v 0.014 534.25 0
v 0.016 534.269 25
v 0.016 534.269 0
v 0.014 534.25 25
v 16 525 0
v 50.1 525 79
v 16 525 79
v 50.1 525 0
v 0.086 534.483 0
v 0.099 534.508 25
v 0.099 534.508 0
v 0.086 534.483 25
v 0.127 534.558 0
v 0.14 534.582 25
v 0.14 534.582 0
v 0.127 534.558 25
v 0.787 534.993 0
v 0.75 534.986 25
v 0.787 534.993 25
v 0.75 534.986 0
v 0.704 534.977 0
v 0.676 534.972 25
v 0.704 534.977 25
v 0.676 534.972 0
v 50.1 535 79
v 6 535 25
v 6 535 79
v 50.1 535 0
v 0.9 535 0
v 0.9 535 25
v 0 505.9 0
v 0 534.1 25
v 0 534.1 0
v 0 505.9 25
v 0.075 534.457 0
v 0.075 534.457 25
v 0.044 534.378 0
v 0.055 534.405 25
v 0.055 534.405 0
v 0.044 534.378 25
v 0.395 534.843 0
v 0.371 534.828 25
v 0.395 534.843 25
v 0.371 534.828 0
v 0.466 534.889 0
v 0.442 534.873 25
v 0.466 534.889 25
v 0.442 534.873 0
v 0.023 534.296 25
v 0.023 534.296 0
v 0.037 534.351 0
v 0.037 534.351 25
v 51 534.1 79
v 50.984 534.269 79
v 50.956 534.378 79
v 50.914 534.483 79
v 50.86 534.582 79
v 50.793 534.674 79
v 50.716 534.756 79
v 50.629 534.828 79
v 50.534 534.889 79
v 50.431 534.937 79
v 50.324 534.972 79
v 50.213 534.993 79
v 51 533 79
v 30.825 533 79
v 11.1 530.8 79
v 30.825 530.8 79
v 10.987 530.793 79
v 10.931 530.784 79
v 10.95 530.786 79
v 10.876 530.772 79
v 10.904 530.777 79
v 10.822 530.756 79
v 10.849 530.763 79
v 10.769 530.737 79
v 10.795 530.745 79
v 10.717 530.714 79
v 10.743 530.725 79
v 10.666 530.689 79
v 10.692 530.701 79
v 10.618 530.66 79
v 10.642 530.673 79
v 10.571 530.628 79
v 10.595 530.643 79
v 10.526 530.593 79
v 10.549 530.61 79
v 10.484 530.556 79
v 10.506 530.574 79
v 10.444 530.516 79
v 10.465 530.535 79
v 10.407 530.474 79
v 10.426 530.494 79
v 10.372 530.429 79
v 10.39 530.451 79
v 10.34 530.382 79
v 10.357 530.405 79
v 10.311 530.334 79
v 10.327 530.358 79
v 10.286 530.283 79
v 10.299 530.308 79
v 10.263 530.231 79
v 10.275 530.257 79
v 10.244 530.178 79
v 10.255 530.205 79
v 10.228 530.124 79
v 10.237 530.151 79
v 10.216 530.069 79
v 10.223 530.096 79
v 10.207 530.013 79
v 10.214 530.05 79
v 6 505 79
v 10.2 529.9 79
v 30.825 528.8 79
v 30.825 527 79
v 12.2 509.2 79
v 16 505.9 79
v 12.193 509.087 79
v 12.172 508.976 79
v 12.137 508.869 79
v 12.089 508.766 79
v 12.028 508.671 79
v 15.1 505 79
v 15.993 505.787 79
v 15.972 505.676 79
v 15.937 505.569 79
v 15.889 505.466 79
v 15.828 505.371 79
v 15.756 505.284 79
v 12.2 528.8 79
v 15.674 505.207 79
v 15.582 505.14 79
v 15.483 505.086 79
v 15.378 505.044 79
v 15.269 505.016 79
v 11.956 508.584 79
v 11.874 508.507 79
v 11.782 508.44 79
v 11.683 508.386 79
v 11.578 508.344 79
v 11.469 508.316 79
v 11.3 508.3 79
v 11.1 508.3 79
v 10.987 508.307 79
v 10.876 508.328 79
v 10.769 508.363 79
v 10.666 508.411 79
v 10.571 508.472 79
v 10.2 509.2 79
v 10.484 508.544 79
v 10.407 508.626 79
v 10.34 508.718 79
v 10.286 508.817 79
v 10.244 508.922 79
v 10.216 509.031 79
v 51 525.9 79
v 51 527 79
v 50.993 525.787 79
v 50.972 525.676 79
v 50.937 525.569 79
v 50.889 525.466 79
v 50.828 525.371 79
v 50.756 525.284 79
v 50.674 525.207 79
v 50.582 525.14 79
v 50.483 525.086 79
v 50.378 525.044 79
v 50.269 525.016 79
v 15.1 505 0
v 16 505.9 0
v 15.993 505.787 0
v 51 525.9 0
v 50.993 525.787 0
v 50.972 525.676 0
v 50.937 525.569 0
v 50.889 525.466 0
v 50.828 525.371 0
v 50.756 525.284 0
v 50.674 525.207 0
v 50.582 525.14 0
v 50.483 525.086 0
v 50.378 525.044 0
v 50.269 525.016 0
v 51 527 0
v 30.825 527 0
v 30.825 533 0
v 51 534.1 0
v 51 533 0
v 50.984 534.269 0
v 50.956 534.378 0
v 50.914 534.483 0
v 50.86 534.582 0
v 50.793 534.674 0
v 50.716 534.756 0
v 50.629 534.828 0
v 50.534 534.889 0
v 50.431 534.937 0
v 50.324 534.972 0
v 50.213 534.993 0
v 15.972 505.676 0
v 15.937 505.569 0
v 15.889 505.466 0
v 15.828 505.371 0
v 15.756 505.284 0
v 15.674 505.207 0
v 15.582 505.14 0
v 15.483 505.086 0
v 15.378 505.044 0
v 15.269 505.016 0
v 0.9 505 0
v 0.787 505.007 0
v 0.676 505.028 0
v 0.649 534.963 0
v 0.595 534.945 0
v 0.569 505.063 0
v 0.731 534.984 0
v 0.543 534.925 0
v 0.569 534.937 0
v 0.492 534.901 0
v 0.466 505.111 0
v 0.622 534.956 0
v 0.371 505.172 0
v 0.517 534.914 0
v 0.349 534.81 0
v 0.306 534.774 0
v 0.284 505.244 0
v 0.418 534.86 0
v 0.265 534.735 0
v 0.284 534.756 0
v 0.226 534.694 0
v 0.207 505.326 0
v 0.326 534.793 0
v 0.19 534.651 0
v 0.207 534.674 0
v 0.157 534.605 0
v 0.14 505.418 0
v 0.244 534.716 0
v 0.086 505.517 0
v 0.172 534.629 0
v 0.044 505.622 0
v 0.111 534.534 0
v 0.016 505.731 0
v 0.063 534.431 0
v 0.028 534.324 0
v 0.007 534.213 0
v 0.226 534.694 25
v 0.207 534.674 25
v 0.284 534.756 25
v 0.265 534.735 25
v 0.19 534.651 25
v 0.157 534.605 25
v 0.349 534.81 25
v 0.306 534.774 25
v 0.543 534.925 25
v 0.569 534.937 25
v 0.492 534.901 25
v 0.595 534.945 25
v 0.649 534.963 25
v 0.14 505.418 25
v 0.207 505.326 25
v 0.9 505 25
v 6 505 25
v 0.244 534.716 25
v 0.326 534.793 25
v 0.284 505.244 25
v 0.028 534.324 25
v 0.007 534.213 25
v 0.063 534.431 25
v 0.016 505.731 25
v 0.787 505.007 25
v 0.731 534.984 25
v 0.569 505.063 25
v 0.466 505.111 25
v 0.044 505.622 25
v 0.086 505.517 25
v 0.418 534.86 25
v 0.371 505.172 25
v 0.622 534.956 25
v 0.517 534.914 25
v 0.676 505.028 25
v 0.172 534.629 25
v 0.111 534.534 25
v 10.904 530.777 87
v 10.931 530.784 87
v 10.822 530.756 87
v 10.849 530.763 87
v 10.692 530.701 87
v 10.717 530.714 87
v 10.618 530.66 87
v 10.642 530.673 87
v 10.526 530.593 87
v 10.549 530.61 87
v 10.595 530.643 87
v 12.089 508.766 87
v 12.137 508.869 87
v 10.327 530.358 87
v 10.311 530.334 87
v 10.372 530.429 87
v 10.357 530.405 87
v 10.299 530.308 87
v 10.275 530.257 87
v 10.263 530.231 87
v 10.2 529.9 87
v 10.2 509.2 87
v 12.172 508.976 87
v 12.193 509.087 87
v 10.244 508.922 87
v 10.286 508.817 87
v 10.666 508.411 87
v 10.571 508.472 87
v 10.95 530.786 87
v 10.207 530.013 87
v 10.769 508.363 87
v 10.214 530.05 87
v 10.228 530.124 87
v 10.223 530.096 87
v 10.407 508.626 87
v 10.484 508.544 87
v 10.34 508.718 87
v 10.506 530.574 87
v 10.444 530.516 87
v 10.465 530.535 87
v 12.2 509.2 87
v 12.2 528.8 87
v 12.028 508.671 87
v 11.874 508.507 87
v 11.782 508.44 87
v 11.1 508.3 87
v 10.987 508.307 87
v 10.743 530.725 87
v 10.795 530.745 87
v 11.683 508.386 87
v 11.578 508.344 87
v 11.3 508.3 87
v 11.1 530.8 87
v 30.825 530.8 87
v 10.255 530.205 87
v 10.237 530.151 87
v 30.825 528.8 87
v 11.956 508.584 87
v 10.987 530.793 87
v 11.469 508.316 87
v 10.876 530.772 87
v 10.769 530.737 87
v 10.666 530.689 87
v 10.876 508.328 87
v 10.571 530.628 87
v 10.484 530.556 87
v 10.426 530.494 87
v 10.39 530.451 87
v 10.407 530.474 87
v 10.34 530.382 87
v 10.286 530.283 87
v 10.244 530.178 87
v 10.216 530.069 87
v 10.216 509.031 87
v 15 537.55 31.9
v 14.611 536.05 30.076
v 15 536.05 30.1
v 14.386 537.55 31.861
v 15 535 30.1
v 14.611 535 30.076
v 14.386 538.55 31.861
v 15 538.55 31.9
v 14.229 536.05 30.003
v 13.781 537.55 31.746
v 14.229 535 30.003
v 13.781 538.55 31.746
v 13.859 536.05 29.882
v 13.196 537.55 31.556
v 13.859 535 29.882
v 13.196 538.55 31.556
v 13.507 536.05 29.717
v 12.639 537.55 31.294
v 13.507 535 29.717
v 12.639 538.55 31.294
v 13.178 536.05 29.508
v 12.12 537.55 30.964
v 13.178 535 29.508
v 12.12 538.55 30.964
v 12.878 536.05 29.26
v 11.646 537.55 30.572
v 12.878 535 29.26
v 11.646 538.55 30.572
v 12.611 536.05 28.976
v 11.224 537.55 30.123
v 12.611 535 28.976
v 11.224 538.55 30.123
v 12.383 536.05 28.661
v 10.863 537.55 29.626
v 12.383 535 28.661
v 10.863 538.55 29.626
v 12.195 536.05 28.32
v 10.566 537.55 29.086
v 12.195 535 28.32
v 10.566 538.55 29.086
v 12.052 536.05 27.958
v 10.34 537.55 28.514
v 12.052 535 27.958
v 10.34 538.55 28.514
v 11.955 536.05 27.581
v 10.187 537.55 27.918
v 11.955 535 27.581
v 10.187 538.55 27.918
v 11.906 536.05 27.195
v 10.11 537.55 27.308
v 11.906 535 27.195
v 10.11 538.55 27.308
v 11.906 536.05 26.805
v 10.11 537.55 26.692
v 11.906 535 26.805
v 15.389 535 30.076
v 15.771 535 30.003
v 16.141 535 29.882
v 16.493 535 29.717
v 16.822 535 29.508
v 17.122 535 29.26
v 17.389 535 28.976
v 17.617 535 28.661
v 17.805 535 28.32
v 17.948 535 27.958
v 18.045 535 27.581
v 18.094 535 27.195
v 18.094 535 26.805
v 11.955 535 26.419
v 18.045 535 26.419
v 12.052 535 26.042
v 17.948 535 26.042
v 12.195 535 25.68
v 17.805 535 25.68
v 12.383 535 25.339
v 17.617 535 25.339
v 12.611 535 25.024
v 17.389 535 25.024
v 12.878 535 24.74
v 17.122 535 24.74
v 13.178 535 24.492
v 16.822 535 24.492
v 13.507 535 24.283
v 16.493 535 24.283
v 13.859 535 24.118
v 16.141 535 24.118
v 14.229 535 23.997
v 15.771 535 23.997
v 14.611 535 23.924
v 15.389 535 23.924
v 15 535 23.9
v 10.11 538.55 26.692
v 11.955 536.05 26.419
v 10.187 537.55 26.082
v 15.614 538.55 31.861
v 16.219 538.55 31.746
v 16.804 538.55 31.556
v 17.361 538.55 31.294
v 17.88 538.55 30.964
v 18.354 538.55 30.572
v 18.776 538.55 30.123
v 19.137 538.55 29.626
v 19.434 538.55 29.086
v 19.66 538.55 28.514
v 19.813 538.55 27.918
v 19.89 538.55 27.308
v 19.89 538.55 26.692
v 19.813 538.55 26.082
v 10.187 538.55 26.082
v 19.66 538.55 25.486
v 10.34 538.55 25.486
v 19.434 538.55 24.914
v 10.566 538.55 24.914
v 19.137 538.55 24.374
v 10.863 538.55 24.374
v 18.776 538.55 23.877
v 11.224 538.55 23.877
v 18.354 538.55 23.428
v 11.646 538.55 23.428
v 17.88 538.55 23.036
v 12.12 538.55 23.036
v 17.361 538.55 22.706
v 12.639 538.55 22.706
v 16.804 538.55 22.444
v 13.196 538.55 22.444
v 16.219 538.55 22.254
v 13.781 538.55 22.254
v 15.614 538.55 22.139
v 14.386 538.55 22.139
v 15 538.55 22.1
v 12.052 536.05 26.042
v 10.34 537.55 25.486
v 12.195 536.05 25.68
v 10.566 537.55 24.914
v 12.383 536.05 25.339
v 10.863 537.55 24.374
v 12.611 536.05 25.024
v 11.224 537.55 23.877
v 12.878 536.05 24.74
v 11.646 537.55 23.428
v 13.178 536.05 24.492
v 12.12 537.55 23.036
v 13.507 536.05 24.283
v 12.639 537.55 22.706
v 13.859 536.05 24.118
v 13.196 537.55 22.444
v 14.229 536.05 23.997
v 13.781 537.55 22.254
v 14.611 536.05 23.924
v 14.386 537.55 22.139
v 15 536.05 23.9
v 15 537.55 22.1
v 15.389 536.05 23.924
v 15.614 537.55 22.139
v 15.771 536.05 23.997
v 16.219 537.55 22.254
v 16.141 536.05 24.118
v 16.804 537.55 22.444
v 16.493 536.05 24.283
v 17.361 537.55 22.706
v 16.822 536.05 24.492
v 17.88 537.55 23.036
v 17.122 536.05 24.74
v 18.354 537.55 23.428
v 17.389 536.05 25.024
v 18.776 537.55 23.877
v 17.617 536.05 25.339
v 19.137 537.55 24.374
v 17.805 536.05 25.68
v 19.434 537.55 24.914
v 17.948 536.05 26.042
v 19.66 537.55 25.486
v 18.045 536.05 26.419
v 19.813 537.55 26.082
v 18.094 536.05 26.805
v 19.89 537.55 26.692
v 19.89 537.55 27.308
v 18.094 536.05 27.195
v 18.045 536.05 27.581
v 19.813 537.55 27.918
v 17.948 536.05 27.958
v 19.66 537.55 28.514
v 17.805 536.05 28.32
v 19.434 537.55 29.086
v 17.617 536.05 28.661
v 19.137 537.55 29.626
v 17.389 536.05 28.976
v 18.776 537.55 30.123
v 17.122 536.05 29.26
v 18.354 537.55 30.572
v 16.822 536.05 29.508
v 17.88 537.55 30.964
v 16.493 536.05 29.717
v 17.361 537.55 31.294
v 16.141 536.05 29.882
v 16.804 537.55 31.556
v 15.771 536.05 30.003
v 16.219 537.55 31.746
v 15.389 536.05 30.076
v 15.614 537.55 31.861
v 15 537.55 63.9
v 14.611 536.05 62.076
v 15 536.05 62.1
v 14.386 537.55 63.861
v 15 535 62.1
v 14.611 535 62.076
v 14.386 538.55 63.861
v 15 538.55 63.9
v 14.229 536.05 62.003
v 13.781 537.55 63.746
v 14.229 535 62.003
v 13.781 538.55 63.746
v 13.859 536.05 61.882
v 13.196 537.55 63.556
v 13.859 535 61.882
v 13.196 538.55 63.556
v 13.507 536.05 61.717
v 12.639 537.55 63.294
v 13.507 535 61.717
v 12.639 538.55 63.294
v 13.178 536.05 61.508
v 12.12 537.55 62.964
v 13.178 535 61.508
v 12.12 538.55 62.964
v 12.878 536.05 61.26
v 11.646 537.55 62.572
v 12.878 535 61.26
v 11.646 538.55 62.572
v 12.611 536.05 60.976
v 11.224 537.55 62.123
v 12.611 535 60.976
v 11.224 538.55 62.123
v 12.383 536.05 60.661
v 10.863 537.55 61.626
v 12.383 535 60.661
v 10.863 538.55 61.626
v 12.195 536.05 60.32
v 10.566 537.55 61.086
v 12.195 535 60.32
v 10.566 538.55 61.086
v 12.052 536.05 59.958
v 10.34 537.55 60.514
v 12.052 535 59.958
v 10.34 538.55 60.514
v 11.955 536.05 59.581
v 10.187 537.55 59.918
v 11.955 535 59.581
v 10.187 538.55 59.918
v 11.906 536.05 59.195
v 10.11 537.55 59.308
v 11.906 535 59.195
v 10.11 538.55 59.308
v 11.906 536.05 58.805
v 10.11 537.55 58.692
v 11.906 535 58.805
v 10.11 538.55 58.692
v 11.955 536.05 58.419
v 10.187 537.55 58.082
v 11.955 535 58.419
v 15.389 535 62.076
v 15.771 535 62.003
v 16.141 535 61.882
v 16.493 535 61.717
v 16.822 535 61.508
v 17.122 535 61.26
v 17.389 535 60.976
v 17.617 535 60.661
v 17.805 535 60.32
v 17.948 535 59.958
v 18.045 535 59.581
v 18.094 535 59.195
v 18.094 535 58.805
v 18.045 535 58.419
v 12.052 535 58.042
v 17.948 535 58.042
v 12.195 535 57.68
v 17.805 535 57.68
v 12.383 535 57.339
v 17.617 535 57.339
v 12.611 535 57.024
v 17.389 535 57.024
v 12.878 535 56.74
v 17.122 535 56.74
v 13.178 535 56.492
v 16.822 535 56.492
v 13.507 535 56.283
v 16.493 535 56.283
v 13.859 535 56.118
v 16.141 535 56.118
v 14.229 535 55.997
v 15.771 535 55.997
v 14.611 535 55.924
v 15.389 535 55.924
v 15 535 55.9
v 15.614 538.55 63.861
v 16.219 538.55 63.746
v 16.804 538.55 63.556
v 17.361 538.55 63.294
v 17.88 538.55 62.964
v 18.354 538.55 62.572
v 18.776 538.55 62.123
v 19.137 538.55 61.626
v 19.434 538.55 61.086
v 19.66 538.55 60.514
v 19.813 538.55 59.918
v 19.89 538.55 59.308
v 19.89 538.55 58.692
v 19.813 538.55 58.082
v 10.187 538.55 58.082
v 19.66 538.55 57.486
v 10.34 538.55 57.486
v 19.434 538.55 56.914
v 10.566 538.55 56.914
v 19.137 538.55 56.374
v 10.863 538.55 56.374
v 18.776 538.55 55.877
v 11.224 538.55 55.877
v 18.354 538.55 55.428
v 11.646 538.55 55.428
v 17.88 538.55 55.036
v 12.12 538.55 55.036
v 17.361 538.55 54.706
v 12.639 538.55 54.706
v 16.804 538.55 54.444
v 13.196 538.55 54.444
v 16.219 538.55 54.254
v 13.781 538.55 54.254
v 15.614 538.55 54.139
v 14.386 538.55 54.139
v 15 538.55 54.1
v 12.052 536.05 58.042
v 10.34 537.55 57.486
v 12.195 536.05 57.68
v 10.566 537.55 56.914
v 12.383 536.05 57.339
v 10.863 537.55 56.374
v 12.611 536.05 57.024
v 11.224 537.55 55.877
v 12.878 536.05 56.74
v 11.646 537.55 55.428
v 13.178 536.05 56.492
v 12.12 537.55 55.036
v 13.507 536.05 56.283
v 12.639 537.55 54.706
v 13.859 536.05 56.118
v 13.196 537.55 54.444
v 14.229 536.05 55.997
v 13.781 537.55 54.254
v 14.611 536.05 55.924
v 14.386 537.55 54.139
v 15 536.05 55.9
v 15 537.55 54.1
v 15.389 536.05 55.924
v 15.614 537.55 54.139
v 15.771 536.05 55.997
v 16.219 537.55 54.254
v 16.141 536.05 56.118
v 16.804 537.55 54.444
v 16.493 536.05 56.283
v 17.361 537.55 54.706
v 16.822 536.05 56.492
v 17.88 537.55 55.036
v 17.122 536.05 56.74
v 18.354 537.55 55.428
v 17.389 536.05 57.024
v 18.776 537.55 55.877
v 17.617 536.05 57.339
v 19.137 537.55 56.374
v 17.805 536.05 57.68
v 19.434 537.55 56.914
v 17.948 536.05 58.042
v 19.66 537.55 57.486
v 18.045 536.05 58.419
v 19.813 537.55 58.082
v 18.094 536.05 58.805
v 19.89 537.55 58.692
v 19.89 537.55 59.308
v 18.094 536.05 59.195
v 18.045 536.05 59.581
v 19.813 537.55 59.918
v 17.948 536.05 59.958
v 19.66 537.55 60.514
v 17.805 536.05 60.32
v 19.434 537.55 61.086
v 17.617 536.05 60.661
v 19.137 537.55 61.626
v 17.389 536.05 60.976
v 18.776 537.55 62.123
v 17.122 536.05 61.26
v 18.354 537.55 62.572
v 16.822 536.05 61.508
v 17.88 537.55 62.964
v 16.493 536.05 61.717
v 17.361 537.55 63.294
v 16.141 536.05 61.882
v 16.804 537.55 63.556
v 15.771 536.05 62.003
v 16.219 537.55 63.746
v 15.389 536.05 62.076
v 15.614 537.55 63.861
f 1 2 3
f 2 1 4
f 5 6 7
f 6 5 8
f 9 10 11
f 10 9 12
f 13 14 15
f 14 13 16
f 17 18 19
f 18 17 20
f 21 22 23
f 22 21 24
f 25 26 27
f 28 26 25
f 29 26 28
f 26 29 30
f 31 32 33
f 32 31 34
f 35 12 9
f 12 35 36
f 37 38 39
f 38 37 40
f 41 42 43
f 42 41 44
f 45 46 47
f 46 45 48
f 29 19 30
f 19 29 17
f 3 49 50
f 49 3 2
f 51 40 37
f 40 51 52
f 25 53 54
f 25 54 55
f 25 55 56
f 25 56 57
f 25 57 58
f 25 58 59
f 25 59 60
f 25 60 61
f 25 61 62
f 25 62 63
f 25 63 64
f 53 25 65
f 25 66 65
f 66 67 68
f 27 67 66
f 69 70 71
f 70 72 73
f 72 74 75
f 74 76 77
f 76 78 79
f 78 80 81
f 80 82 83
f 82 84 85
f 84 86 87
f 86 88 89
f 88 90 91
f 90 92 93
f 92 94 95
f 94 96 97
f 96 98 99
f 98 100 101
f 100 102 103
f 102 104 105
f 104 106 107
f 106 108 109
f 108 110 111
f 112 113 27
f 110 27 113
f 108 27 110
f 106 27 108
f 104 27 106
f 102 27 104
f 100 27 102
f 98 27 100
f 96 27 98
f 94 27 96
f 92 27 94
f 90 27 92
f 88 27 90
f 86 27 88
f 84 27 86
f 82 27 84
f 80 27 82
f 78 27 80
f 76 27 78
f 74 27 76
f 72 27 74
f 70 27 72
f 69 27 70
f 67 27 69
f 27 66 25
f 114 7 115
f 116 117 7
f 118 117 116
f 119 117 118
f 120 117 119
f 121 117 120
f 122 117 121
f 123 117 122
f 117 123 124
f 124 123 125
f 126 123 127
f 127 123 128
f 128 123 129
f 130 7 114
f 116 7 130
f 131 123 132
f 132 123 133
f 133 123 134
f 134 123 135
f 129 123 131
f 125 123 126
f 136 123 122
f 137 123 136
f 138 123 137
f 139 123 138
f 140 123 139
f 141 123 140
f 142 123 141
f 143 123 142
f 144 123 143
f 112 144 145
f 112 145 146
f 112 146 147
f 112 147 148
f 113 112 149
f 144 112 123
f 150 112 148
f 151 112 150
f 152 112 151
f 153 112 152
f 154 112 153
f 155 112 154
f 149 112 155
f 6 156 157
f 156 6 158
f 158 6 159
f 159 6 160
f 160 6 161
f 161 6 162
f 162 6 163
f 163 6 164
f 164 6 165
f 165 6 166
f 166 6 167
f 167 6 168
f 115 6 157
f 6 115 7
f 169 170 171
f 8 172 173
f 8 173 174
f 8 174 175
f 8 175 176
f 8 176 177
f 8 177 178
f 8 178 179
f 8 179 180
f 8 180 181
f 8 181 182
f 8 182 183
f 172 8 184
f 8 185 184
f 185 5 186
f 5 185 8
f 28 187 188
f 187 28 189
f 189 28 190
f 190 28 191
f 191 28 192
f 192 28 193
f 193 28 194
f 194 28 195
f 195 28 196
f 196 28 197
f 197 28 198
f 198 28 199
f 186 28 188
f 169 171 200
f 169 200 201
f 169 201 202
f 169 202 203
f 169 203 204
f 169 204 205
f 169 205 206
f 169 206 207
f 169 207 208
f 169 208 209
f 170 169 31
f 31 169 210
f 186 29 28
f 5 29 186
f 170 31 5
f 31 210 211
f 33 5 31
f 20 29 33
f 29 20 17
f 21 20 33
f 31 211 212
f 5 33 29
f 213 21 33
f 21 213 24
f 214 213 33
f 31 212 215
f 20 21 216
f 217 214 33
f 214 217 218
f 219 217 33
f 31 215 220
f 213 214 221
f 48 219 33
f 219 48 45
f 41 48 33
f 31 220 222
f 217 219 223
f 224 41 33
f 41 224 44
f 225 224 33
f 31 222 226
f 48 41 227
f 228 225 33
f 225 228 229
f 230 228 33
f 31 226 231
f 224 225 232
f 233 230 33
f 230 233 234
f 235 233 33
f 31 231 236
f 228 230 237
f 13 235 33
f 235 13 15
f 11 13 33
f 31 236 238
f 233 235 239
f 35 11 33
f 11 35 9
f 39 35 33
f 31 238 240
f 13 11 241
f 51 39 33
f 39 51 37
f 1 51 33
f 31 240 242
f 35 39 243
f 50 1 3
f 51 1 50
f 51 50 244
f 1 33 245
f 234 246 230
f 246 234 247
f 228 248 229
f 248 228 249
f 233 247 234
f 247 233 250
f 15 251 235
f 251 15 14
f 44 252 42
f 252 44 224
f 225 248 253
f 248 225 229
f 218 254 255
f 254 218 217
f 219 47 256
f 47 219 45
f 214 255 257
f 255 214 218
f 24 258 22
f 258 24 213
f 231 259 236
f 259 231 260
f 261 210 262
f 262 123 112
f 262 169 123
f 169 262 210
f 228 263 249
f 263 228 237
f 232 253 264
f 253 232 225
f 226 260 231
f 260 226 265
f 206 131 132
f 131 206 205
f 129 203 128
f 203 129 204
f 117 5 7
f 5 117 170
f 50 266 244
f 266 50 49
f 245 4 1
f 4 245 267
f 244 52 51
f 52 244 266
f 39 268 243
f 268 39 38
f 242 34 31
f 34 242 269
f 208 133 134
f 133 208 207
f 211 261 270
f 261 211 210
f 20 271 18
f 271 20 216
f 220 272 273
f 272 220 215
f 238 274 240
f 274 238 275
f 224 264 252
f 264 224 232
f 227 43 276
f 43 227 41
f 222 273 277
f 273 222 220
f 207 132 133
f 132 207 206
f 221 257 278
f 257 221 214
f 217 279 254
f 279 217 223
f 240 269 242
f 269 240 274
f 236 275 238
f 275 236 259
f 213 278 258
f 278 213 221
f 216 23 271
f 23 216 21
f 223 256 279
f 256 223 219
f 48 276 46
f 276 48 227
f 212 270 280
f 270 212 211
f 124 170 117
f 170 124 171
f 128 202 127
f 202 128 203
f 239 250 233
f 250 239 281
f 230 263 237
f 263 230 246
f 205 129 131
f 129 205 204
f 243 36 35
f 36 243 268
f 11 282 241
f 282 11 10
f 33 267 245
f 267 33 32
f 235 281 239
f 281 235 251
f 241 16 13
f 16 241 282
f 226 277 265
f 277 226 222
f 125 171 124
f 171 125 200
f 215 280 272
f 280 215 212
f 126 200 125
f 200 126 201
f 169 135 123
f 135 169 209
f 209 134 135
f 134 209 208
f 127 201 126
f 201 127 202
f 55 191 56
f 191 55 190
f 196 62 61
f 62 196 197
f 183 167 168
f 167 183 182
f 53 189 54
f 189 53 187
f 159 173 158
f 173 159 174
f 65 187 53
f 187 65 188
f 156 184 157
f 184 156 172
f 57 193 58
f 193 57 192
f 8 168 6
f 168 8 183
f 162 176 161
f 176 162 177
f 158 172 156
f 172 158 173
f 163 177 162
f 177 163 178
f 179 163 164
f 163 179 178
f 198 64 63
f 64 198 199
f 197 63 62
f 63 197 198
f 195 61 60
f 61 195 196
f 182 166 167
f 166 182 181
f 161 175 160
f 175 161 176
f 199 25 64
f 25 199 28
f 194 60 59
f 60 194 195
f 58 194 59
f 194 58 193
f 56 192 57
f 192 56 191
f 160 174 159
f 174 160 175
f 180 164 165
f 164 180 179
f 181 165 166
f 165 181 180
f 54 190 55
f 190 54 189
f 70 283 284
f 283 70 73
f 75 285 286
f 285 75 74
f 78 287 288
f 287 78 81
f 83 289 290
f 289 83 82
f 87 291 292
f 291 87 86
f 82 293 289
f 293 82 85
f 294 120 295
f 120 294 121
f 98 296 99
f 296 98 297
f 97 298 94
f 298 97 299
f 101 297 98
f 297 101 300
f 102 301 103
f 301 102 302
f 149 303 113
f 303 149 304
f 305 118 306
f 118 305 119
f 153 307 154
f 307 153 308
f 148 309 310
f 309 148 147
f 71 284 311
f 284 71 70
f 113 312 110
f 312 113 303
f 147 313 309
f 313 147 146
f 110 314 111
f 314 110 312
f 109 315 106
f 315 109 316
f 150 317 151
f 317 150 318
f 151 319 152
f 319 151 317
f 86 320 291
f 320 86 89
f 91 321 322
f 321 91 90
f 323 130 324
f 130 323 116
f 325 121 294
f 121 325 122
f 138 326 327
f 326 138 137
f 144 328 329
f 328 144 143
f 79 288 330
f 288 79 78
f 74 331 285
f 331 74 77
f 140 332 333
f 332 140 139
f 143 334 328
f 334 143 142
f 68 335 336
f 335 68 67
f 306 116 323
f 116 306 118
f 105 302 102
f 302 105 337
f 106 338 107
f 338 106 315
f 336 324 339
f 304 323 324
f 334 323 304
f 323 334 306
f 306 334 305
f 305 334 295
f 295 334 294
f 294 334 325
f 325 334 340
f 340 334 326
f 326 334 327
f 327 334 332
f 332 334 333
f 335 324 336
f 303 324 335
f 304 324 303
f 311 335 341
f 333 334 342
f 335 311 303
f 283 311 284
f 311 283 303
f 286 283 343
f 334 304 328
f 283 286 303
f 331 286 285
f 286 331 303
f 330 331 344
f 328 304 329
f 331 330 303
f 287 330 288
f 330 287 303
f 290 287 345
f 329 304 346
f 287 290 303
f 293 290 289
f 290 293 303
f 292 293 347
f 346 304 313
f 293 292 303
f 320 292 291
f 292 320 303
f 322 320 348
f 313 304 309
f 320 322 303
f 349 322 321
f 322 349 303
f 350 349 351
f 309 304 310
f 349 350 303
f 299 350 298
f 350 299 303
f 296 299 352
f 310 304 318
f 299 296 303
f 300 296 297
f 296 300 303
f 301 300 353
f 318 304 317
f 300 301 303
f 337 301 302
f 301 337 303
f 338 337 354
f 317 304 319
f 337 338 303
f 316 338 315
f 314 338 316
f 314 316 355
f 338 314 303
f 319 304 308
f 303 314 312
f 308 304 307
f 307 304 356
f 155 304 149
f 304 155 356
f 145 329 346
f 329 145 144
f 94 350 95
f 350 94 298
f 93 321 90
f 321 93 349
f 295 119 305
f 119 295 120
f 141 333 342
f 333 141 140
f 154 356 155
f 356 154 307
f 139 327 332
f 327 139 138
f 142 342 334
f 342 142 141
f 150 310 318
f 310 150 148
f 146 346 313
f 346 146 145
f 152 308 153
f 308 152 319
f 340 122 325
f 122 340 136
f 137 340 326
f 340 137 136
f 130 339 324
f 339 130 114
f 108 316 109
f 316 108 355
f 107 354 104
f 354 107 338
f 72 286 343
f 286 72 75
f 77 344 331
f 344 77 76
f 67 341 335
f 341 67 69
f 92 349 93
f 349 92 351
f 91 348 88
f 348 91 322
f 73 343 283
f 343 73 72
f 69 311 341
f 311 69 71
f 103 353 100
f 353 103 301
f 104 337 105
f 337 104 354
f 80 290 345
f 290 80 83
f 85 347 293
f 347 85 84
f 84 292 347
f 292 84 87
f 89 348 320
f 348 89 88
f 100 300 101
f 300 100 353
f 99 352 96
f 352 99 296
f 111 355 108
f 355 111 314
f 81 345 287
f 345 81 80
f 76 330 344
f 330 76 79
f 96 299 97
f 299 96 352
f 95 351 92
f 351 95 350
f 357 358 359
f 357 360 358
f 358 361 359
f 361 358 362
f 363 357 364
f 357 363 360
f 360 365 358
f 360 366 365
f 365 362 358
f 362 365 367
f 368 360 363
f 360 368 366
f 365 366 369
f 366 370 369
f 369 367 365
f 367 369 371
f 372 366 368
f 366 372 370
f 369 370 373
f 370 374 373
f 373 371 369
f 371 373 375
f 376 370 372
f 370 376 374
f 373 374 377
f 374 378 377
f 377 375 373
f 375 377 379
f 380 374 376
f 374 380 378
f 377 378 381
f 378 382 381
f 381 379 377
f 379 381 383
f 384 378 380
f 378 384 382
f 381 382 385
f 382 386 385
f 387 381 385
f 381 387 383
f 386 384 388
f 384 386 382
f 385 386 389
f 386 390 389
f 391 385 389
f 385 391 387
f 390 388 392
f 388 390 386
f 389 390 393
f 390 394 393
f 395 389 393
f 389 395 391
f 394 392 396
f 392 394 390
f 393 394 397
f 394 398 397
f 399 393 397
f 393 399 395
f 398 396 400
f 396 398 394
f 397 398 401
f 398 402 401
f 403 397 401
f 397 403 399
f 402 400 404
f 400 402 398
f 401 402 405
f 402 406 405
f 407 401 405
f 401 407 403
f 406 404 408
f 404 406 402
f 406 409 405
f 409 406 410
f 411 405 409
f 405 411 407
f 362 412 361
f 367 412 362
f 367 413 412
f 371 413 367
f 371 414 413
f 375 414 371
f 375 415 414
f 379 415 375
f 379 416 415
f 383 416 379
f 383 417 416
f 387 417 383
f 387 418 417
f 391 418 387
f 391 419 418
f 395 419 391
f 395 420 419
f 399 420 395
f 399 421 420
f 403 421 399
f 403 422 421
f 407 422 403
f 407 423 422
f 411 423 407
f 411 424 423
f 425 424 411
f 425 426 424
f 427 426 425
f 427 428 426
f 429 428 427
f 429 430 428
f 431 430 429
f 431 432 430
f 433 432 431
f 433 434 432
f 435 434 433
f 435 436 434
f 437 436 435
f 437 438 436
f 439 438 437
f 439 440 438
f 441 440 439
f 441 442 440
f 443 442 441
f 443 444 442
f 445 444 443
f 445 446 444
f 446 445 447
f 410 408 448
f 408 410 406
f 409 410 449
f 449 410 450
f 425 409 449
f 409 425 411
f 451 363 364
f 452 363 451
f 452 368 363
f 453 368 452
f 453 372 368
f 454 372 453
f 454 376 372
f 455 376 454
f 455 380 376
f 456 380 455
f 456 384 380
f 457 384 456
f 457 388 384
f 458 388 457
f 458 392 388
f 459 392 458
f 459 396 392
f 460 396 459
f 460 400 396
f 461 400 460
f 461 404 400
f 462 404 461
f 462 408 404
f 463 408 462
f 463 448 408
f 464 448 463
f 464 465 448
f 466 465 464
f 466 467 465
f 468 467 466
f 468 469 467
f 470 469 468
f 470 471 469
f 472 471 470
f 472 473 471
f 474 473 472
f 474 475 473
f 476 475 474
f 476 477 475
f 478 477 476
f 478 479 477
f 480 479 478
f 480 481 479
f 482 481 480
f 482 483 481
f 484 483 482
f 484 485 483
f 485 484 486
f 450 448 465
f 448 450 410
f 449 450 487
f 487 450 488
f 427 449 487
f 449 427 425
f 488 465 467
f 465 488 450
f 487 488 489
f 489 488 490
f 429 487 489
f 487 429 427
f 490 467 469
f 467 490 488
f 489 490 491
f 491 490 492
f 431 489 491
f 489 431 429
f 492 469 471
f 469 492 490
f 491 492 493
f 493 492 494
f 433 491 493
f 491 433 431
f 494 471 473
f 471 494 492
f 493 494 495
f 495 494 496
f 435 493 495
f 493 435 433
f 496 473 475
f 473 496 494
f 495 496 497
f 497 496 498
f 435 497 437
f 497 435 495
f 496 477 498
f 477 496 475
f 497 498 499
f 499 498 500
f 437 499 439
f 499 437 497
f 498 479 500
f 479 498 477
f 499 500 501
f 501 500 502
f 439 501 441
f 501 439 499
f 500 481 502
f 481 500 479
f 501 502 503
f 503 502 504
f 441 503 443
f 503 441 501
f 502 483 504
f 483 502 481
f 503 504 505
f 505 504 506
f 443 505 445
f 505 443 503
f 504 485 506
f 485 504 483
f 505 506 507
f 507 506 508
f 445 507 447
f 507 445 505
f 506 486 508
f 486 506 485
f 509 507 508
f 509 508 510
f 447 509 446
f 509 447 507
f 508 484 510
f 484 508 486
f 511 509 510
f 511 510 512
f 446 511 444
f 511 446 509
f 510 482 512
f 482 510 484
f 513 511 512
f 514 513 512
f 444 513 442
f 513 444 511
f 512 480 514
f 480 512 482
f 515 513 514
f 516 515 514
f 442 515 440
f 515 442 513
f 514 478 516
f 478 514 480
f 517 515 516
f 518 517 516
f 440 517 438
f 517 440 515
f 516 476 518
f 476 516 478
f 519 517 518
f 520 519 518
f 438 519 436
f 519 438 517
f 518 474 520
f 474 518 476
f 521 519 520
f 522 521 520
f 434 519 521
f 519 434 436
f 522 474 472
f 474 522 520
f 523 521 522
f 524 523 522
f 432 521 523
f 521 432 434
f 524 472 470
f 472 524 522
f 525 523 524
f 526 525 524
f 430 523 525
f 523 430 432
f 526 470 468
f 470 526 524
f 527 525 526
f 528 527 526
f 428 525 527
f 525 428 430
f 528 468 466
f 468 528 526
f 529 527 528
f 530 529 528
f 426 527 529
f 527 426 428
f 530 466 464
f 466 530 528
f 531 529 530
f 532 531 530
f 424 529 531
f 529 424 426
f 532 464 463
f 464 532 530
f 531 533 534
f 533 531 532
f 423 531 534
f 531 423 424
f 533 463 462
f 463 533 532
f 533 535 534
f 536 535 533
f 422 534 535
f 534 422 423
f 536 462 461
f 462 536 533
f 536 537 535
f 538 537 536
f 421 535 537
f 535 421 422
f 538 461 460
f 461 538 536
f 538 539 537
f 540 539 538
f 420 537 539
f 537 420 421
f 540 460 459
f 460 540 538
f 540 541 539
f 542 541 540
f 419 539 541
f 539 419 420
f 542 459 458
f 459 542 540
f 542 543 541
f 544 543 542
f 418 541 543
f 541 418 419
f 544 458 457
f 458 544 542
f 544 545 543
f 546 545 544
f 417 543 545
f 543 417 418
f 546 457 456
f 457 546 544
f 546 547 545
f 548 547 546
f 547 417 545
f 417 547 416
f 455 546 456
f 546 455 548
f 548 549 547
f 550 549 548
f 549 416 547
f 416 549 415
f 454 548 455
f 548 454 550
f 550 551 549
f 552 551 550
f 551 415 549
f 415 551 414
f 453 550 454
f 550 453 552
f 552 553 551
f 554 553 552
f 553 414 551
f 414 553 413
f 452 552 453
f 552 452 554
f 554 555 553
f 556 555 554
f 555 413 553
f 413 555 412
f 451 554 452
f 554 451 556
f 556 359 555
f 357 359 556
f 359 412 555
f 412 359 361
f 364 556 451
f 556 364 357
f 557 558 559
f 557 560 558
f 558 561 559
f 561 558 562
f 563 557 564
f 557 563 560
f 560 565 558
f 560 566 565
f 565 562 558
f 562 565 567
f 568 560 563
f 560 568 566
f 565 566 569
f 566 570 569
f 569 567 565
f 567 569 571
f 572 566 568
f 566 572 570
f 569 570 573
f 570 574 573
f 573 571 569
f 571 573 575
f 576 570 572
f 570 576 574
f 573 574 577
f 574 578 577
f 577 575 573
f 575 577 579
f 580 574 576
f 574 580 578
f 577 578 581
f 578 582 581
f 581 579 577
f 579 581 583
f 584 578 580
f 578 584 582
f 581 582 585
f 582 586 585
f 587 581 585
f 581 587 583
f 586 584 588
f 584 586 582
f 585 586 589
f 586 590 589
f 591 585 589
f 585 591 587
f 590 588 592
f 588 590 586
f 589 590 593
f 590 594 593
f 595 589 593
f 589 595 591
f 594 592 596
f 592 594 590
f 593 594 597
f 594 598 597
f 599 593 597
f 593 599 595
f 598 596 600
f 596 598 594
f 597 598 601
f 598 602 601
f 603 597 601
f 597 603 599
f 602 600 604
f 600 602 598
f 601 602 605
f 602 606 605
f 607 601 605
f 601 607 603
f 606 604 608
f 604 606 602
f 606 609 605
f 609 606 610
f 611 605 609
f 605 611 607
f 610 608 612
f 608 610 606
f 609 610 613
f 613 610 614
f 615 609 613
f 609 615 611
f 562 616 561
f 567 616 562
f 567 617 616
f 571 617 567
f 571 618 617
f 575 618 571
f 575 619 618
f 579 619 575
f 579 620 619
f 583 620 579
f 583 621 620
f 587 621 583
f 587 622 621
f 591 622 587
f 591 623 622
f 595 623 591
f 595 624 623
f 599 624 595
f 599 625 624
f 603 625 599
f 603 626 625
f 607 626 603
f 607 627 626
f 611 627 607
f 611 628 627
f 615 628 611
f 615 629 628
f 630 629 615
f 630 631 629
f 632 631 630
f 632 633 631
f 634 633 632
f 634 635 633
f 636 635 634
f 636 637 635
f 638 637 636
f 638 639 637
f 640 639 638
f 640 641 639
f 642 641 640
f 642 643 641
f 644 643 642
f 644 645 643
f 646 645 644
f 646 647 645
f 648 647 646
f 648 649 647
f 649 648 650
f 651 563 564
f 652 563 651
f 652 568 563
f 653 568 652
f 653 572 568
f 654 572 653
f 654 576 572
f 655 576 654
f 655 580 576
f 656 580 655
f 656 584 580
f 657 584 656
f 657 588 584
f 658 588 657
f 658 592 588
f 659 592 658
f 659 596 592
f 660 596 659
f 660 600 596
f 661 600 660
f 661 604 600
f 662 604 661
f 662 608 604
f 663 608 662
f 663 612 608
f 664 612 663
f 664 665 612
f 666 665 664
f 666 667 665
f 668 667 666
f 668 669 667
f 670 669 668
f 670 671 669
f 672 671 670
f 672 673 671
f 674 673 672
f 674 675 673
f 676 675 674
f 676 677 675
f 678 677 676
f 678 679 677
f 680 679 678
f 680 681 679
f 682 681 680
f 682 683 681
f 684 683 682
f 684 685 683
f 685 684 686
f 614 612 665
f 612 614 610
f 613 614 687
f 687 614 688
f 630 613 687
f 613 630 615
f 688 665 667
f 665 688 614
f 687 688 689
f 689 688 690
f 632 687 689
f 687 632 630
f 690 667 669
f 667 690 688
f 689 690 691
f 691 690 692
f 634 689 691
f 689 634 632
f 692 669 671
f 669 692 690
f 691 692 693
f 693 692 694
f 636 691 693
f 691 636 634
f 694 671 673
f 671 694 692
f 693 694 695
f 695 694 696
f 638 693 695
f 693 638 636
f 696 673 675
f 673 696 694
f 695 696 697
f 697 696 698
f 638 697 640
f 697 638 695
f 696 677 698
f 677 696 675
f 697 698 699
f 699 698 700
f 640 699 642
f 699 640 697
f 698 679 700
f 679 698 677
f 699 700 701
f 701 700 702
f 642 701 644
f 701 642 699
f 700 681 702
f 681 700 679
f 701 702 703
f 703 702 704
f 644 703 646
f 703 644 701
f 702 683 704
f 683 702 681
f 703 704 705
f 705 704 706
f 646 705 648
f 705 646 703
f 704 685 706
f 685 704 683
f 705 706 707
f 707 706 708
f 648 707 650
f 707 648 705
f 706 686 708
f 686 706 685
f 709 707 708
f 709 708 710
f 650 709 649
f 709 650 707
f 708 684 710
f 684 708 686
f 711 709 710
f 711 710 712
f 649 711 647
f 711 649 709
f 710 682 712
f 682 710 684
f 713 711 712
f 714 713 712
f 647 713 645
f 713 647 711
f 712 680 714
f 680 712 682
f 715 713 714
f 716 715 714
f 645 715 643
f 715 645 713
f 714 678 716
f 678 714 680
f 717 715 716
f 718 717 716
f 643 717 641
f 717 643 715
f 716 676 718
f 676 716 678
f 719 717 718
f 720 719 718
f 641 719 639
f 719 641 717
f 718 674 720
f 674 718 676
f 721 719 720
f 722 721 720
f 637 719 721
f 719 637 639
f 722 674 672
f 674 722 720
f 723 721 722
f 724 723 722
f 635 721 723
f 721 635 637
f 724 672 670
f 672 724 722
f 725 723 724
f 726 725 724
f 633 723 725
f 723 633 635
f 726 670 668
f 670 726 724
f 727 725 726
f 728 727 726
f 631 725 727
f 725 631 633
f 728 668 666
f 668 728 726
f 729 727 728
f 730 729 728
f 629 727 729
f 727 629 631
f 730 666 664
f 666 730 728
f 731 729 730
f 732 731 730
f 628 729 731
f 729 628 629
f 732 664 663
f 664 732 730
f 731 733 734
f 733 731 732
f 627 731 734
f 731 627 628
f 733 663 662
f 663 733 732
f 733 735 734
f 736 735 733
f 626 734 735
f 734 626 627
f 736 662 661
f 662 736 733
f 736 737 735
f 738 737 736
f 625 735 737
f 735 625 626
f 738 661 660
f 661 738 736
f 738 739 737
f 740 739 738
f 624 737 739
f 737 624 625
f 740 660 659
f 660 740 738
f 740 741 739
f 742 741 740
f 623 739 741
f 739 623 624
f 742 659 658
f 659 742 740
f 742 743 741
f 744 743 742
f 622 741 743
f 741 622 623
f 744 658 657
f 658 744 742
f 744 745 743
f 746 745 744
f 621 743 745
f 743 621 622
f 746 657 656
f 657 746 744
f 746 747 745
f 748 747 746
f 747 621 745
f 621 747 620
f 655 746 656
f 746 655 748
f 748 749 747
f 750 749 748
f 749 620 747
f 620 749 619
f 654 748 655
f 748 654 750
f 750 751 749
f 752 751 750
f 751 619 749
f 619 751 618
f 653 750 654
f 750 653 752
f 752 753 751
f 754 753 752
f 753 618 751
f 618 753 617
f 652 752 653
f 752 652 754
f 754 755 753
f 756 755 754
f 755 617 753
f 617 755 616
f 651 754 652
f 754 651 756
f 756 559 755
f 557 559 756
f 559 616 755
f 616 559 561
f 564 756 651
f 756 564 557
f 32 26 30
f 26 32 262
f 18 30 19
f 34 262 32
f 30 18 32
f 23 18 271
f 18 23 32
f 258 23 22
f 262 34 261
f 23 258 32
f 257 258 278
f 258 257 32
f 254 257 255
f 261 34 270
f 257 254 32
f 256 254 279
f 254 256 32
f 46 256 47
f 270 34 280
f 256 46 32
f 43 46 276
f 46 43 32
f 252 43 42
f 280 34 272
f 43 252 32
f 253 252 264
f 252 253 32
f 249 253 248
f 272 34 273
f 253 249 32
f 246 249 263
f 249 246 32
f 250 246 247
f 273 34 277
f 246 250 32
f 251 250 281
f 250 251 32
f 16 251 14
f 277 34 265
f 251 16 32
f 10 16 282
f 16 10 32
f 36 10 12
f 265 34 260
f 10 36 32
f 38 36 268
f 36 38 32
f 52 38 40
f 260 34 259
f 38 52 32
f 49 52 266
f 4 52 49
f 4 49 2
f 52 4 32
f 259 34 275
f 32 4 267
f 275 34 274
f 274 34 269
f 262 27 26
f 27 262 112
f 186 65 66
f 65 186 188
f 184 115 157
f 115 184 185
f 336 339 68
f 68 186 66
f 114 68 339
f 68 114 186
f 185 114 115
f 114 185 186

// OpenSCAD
// file: construction.scad
/*
Specialized construction functions specifically for the enclosure.
By combining these operators the various instances of enclosure pieces 
can be constructed.
*/
include <parameters.scad>;
use <utility.scad>;

module lug() {
    ra = knob_diameter/2;
    rb = lug_diameter/2;
    rotate([0,90,90]) 
        rotate_extrude()
            color("DarkSeaGreen")
            polygon([[0,0],[0,lug_height],[rb,lug_height],
                [rb,2.5],[ra,1],[ra,0]]);
}

// extend the corner frame to be symmetrical with the front corner
module extend_frame_x(height=frame_corner_height) {
    union() {
        children();
        color("SteelBlue")
        translate([hinge_inner_diameter*2, hinge_inner_diameter,0]) 
            rotate([0,0,-90])
                frame( hinge_inner_diameter*3+1, 
                    height, hinge_inner_diameter, 
                    corner_roundness );
    }
}

module frame( width, height, thickness, roundness ) {
        linear_extrude(height=height)
            apply_roundness(roundness, $fs =0.01) 
                    square( [thickness, width] );
}

module frame_corner( width, height, thickness, roundness ) {    
    union() {
        mirror([0,1,0]) 
            rotate([0,0,-90])
                frame( width, height, thickness, roundness );
        frame( width, height, thickness + panel_thickness, roundness );
    }   
}

module frame_connector_corner(clearance=0) {
    translate([panel_thickness*1.7,panel_thickness*0.70, 0]) 
        cornerize()
            frame( frame_corner_width*0.75, frame_connector_depth, 
                frame_thickness*.20+clearance, corner_roundness );
        
}

module add_lugs() {   
    union() {
        children();
        translate([lug_offset_x,-lug_height,lug_offset_z]) 
            lug();
        translate([lug_offset_x,-lug_height, lug_offset_z+lug_offset_gap])
            lug(); 
    } 
}

module add_connector(height=frame_corner_height) {
    union() {
        children();

        color("SteelBlue")
        translate([0,0,height])
            frame_connector_corner();
    }
}

module add_hinge_post( top=false ) {
    union() {
        difference() {
            children();

            // create a negative space that snuggly fits the hinge
            translate([frame_corner_width+plastic_thickness+hinge_gap,
                hinge_inner_diameter/2, (top?frame_corner_height:0)])
                mirror(top?[0,0,1]:[0,0,0])
                    union() {
                         height = hinge_height-hinge_inner_diameter;
                        translate([0,0,height/2]) 
                            cube([hinge_inner_diameter+2,
                                hinge_inner_diameter+2,height+1.3],true);
                        // hinge open
                        rotate([0,0,-90]) translate([0,0,-0.1]) scale(1.05) hinge();
                        // hinge closed
                        rotate([0,0,0]) translate([0,0,-0.1]) scale(1.05) hinge();
                    }
            
        }
        color("SteelBlue")
        translate([frame_corner_width+plastic_thickness+hinge_gap,hinge_inner_diameter/2,0])
            cylinder(d=hinge_inner_diameter, frame_corner_height);
    }
}

module add_outside_frame( height ) {
    union() {
        children();
        translate([-plastic_thickness,-plastic_thickness,0])
            color("SteelBlue")
            frame( frame_corner_width+plastic_thickness, height, frame_thickness,
                corner_roundness);
        translate([14.5,0.05,height/2])
            color("SteelBlue")
            rotate([0,0,8])
            cube([frame_corner_width/2,plastic_thickness,height],true);
    }
}

module hinge() {
    height = hinge_height-hinge_inner_diameter;
    width = hinge_inner_diameter+hinge_ring_thickness;
    difference() {
        
        // create the base shape for the hinge
        union() {    
            cylinder(d=width, height);
            
            translate([hinge_inner_diameter*3+hinge_clearance,
                -hinge_offset,height/2-plastic_thickness/2]) 
                cube([hinge_length,hinge_thickness,
                    height+plastic_thickness],true);
           
            translate([2.52,-5.2,height/2]) 
                rotate([0,0,40]) 
                    cube([hinge_inner_diameter,
                        width+1,height],true);
        }
        
        // remove a hole for the hinge post to slide into
        cylinder(d=hinge_inner_diameter+tolerance_smooth, height+1);
        
        // trim the left corner
        translate([4,-17.5,height/2-1]) 
            rotate([0,0,145]) 
                cube([50,width-2,height+3],true);
        
        // smooth the tranistion to the bottom edge
        translate([32,-10,height/2-18.25]) 
            rotate([-88.5,0.1,96]) 
                cube([40,20,60],true);
        
        // add a chamfer to right corner
        translate([hinge_length+8,0,height+25]) 
            rotate([0,45,0]) 
            cube(50,true);
    }   
}

module add_connector_slot() {
    difference() {
        children();
        frame_connector_corner(tolerance_tight);
    }
}

module frame_vertical() {
    add_connector_slot()
    add_connector(frame_vertical_height)
    extend_frame_x(frame_vertical_height)
        frame_corner( frame_corner_width, 
            frame_vertical_height, frame_thickness, 
            corner_roundness );          
}

module grip() {
    rotate([90,90,90])
        color("DarkSeaGreen")
        frame(plastic_thickness,plastic_thickness,plastic_thickness,corner_roundness);
}

module add_snap_lock_slot(top=false) {
    difference() {
        children();
        translate([0,0,top?frame_corner_height+shelf_height:-shelf_height])
            mirror(top?[0,0,1]:[0,0,0])
                 snaplock(tolerance_tight,top);
    }
}

module lug2(clearance) {
    color("DarkSeaGreen")
    rotate([90,0,0])
            frame(frame_connector_depth+clearance,snaplock_connector_size/2,
                connector_thickness+clearance,corner_roundness);
}

module snaplock(clearance=0,top=false) {
    height = shelf_height+snaplock_connector_size+plastic_thickness+clearance;
    union() {
        color("Magenta")
        difference() {
            translate([snaplock_size,-snaplock_thickness*3,-plastic_thickness])
                rotate([0,0,90])
                    frame(snaplock_size+clearance,height,
                        snaplock_width*2+plastic_thickness, corner_roundness);
            fix_preview2() cube([snaplock_size*1.1,snaplock_width+plastic_thickness,shelf_height]);
        }

        // grips at top
        translate([5,1,shelf_height+1.5]) grip();
        translate([18,1,shelf_height+1.5]) grip();

        // grips at bottom
        translate([5,1,0.5]) grip();
        translate([18,1,0.5]) grip();

        // connector lugs
        translate([3*snaplock_size/4-connector_thickness/2-clearance/2,
            frame_connector_depth+snaplock_thickness,
            shelf_height+snaplock_connector_size/2 - (snaplock_connector_size/4)-clearance/2])
            lug2(clearance);

        translate([(top?2:1)*snaplock_size/4-connector_thickness/2-clearance/2,
            frame_connector_depth+snaplock_thickness,
            shelf_height+snaplock_connector_size/2 - (snaplock_connector_size/4)-clearance/2])
            lug2(clearance);
    }
}
// file: support.scad
/*
Provides support objects that are used to model the environment of the enclosure
to ensure the pieces slot together and fit properly.
*/
include <parameters.scad>;
use <utility.scad>;

module wall_panel() {
    cube([panel_height,panel_width,panel_thickness]);
}

module door_panel() {
     cube([door_panel_width,door_panel_height,door_panel_thickness]);
}

module left_wall_panel() {
    translate([panel_thickness,0,panel_offset_z]) 
        rotate([0,-90,0]) 
            wall_panel();
}

module back_wall_panel() {
    translate([(enclosure_width-panel_width)/2,
            enclosure_depth-panel_thickness-plastic_thickness,
            0]) 
        rotate([-90,-90,0]) 
            wall_panel();
}

module right_wall_panel() {
    translate([enclosure_width,0,panel_offset_z]) 
        rotate([0,-90,0]) 
            wall_panel();
}

module left_door(open=false) {
    translate([frame_corner_width+plastic_thickness+hinge_gap,
            hinge_inner_diameter/2,0]) 
        rotate([90,0,open?-90:0]) 
            translate([door_hinge_offset,0,hinge_offset-
                    door_panel_thickness/2])
                door_panel();
}

module right_door(open=false) {
    translate([enclosure_width,0,0])  
        mirror([1,0,0]) left_door(open);
}
// file: utility.scad
/*
Generically useful utility functions.
*/

// applies roundness without altering dimensions of object
module apply_roundness(r)
    offset(r) offset(delta=-r) children(0);

// makes a corner piece by mirroring and rotating one side
module cornerize() {
    union() {
        children(0);
        mirror([0,1,0]) 
            rotate([0,0,-90])
                children(0);
    }
} 

module explode(vector) {
    for(i=[0:$children-1])
        translate(vector*i)
            children(i);

}

/*
 The fix_preview series of functions are used to make small
 translations in order to reduce conincident plane artifacts
 from the preview mode. 

 It would be nice to have just one module for this but I haven't
 figured out a way of doing this generically - so the following
 uses a small translation in different directions depending on
 the use case needed.
*/
module fix_preview() {
    translate($preview?[-0.001,-0.001,-0.001]:[0,0,0])
        children(0);
}

module fix_preview2() {
    translate($preview?[-0.001,0.001,-0.001]:[0,0,0])
        children(0);
}

module fix_preview3() {
    translate($preview?[-0.001,0.001,0.001]:[0,0,0])
        children(0);
}
// file: parameters.scad
$fn=50;

// Wall thickness and tolerance
plastic_thickness=2.0;
tolerance_smooth=0.45;
tolerance_tight=0.40;
corner_roundness=0.9;

// Specify enclosure dimensions
enclosure_height=475.0;
enclosure_depth=535.0;

// Wall panel dimensions
panel_thickness=6.0;
panel_height=450.0;
panel_width=535.0;
panel_offset_z = enclosure_height - panel_height;

// Door panel dimensions
door_panel_thickness=3.0;
door_panel_width=250.0;
door_panel_height=475.0;
door_hinge_offset=6.5;

// Frame
frame_corner_width=30.0;
frame_corner_height=79.0;
frame_thickness = plastic_thickness*2 + panel_thickness;
frame_side = (enclosure_height - frame_corner_height*2)/2;
frame_clip_height=50.5;
frame_vertical_height = (enclosure_height-frame_corner_height*2)/2;
frame_connector_depth = 8.0;

// Lug
knob_diameter=9.8;
lug_diameter=6.2;
lug_gap=1.4;
lug_height = lug_gap+2.15;
lug_offset_x=15.0;
lug_offset_z=27.0;
lug_offset_gap=32;

// Snaplock
shelf_height=50.3+tolerance_tight;
snaplock_width=5+tolerance_tight;
snaplock_size=25;
snaplock_thickness=plastic_thickness;
snaplock_connector_size=15;
connector_thickness=frame_thickness*.4;

// Door hinge
hinge_inner_diameter=10;
hinge_height=25;
hinge_length=53;
hinge_gap = 9.6;
hinge_clearance = 1.5;
hinge_ring_thickness=3.0;
hinge_thickness=plastic_thickness*2 + door_panel_thickness;
hinge_offset=6.5+plastic_thickness;

enclosure_width=2*(frame_corner_width+plastic_thickness+hinge_gap
    +door_hinge_offset) + door_panel_width*2 +tolerance_smooth;
// main file
include <parameters.scad>
use <utility.scad>
use <support.scad>
use <construction.scad>

module back_left_bottom_corner() {
    difference() {
        translate([0,enclosure_depth,0])
            mirror([0,1,0])
                add_lugs()
                add_connector() 
                extend_frame_x()
                    color("SteelBlue")
                    frame_corner( frame_corner_width, 
                        frame_corner_height,frame_thickness,
                        corner_roundness);
                    
        fix_preview2() left_wall_panel();
        fix_preview2() back_wall_panel();
    }
}

fix_preview2() %left_wall_panel();
fix_preview2() %back_wall_panel();
back_left_bottom_corner();
